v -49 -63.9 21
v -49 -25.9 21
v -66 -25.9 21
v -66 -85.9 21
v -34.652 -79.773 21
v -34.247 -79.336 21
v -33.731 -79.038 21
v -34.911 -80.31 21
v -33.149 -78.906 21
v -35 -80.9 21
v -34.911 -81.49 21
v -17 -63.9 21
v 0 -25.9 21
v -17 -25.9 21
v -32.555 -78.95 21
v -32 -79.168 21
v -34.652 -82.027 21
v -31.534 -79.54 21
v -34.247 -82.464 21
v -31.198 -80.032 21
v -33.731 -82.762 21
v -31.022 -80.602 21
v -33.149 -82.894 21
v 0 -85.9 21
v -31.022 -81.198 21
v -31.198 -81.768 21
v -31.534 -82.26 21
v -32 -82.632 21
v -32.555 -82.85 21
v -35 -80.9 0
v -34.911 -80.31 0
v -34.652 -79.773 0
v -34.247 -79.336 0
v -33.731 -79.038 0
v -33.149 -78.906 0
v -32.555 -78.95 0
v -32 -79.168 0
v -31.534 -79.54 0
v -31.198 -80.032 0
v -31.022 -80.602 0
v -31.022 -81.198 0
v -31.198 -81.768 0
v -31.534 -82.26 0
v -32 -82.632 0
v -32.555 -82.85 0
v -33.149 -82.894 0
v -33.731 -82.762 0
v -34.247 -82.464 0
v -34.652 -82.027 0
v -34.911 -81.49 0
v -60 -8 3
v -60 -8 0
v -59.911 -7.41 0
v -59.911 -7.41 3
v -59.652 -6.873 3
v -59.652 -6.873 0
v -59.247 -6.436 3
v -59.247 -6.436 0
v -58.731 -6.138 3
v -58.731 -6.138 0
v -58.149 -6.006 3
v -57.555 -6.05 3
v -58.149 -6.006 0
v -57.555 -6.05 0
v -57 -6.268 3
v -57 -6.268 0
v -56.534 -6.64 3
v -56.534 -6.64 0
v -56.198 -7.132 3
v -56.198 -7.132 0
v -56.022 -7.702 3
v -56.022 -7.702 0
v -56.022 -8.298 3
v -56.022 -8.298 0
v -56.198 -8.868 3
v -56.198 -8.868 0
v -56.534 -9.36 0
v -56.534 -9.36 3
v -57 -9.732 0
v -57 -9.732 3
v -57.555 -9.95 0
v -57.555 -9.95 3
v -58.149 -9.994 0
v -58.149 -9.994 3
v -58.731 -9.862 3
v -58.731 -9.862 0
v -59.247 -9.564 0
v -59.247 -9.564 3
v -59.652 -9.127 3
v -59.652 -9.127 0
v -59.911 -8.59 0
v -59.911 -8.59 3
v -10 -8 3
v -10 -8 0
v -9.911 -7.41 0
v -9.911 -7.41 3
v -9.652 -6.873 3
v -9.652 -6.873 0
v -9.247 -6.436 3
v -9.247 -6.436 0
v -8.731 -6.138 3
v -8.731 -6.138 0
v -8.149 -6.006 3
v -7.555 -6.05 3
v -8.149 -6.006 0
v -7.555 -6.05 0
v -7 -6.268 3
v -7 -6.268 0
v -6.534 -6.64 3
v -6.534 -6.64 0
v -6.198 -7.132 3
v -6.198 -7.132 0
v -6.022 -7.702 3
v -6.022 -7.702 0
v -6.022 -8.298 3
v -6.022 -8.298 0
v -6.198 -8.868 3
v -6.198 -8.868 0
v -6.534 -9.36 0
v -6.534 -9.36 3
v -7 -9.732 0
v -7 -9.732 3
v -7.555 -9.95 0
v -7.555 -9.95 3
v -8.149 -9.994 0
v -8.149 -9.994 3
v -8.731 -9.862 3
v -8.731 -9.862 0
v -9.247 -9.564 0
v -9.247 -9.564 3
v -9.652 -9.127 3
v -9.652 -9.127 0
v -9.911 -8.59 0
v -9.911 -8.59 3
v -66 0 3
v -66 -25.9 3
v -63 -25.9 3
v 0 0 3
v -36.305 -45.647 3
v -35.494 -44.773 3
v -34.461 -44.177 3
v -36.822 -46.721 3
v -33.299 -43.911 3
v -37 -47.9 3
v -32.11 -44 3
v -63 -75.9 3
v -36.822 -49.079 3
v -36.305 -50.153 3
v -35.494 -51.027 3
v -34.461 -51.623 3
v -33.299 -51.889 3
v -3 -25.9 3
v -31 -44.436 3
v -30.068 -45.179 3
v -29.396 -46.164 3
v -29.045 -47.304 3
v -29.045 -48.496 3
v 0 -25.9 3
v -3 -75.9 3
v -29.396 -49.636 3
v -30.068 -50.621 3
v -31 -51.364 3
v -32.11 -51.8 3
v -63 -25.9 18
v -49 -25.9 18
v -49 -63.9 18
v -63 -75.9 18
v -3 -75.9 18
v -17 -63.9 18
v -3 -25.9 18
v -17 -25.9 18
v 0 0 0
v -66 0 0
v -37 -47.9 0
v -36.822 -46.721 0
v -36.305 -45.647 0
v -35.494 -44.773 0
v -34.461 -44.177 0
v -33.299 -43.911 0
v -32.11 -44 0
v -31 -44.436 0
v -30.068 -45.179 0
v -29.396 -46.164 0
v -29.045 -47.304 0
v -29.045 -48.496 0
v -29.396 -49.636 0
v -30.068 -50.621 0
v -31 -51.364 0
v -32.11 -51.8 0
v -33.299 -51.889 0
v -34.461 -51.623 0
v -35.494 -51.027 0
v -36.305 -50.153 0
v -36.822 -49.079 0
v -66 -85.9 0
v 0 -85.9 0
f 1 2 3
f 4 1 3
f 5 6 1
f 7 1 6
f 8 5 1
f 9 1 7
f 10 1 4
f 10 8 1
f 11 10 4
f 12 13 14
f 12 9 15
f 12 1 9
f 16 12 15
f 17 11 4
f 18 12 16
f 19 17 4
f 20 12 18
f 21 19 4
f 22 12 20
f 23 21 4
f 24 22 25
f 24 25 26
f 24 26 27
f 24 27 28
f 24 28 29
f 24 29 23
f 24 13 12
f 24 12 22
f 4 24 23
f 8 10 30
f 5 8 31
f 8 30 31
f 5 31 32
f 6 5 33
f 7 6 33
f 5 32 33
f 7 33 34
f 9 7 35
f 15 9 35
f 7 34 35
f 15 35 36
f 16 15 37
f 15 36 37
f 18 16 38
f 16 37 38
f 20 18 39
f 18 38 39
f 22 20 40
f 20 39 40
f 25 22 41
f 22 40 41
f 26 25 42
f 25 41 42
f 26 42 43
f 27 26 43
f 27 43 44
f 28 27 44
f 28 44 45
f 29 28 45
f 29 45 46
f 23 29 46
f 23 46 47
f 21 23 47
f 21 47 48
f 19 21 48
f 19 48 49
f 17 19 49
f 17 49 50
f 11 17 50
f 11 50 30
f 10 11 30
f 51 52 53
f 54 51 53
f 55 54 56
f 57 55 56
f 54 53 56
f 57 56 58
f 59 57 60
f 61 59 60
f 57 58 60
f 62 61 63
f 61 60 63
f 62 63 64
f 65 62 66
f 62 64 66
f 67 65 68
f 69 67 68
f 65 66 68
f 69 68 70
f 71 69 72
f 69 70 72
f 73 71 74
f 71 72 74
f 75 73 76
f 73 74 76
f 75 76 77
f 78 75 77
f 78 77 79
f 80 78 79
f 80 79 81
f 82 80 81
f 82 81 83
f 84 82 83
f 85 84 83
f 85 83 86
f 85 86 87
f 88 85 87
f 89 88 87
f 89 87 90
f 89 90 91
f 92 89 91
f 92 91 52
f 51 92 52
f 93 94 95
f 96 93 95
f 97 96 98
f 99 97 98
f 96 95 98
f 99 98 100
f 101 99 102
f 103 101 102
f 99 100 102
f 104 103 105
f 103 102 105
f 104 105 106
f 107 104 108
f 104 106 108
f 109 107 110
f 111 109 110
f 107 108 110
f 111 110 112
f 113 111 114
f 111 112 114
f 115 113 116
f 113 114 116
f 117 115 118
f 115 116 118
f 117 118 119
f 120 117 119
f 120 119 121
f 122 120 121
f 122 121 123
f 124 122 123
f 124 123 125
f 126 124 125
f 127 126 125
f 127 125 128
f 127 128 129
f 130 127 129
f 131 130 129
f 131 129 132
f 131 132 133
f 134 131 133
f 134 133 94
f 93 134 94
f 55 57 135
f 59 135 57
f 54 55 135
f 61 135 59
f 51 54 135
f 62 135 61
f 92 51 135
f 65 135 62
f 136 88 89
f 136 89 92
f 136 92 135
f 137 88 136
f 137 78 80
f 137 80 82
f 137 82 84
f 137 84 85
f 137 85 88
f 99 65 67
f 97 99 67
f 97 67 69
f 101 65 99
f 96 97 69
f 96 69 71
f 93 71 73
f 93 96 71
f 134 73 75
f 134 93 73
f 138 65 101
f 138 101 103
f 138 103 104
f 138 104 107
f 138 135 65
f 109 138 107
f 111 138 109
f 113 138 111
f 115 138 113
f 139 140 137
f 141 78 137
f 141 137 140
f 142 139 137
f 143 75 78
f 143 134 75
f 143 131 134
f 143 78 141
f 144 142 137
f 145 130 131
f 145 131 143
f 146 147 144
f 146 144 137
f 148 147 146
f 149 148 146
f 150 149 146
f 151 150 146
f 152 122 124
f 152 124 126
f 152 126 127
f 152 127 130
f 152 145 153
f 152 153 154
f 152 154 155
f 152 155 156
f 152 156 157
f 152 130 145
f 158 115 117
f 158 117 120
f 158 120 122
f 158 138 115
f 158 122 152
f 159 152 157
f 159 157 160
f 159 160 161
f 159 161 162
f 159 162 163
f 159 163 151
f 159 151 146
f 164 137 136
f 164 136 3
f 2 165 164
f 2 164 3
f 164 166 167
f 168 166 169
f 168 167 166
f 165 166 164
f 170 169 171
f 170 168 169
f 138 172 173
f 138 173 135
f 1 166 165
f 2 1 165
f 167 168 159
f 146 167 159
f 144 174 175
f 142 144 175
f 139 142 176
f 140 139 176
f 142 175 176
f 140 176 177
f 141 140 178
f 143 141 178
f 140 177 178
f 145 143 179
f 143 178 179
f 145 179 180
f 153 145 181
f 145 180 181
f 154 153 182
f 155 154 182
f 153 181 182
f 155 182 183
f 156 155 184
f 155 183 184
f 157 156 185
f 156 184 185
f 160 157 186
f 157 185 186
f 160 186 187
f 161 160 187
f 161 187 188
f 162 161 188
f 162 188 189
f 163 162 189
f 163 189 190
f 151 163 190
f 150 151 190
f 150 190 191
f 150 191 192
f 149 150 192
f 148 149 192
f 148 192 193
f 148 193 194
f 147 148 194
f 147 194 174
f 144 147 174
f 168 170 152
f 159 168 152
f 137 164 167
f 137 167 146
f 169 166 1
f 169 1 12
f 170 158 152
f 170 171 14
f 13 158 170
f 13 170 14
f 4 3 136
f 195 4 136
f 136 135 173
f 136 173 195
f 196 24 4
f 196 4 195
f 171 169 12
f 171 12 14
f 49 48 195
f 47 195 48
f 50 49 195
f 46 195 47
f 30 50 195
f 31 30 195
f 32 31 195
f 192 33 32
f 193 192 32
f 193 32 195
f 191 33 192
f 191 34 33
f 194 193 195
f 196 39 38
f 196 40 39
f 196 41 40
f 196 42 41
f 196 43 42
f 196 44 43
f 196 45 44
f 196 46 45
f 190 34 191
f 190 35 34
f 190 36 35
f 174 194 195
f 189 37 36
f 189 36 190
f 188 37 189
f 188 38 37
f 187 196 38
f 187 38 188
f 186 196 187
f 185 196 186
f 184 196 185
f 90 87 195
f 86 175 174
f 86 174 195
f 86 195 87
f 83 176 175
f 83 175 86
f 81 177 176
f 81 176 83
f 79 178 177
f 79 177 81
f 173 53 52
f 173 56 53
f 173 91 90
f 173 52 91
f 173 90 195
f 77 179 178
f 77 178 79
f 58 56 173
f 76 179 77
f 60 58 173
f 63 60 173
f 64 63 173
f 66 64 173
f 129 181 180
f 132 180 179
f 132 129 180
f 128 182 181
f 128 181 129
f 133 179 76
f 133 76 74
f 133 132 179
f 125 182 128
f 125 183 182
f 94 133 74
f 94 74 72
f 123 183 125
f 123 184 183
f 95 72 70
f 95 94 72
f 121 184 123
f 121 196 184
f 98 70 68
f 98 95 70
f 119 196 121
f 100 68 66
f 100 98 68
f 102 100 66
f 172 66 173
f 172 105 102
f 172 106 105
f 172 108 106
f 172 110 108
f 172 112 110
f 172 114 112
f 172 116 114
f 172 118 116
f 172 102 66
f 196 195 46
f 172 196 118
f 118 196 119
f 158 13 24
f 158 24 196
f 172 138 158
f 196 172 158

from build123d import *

# Parameters (mm, degrees)
BOSS_EXTRUDE1_DEPTH = 66
CUT_EXTRUDE1_START  = -3
SKETCH2_W           = 15
SKETCH2_H           = 50
CUT_EXTRUDE1_DEPTH  = 60
SKETCH3_W           = 32
SKETCH3_H           = 38
CUT_EXTRUDE2_DEPTH  = 19
SKETCH4_R           = 4
SKETCH4_R_2         = 2
CUT_EXTRUDE3_DEPTH  = 22


with BuildPart() as part:
    # Sketch1 → Boss-Extrude1 (new body)
    with BuildSketch(Plane(origin=(0, 0, 0), x_dir=(0, 0, -1), z_dir=(1, 0, 0))):
        Polygon((-3, -25.9), (-21, -25.9), (-21, -85.9), (0, -85.9), (0, 0), (-3, 0), align=None)
    extrude(amount=-BOSS_EXTRUDE1_DEPTH)

    # Sketch2 → Cut-Extrude1 (cut)
    with BuildSketch(Plane(origin=(0, 0, 0), x_dir=(0, 0, -1), z_dir=(1, 0, 0)).offset(CUT_EXTRUDE1_START)):
        with Locations((-10.5, -50.9)):
            Rectangle(SKETCH2_W, SKETCH2_H)
    extrude(amount=-CUT_EXTRUDE1_DEPTH, mode=Mode.SUBTRACT)

    # Sketch3 → Cut-Extrude2 (cut, through all)
    with BuildSketch(Plane.XY.offset(3)):
        with Locations((-33, -44.9)):
            Rectangle(SKETCH3_W, SKETCH3_H)
    extrude(amount=CUT_EXTRUDE2_DEPTH, mode=Mode.SUBTRACT)

    # Sketch4 → Cut-Extrude3 (cut, through all)
    with BuildSketch(Plane(origin=(0, 0, 0), x_dir=(-1, 0, 0), z_dir=(0, 0, -1))):
        with Locations((33, -47.9)):
            Circle(SKETCH4_R)
        with Locations((33, -80.9)):
            Circle(SKETCH4_R_2)
        with Locations((58, -8)):
            Circle(SKETCH4_R_2)
        with Locations((8, -8)):
            Circle(SKETCH4_R_2)
    extrude(amount=-CUT_EXTRUDE3_DEPTH, mode=Mode.SUBTRACT)


solid = part.part
